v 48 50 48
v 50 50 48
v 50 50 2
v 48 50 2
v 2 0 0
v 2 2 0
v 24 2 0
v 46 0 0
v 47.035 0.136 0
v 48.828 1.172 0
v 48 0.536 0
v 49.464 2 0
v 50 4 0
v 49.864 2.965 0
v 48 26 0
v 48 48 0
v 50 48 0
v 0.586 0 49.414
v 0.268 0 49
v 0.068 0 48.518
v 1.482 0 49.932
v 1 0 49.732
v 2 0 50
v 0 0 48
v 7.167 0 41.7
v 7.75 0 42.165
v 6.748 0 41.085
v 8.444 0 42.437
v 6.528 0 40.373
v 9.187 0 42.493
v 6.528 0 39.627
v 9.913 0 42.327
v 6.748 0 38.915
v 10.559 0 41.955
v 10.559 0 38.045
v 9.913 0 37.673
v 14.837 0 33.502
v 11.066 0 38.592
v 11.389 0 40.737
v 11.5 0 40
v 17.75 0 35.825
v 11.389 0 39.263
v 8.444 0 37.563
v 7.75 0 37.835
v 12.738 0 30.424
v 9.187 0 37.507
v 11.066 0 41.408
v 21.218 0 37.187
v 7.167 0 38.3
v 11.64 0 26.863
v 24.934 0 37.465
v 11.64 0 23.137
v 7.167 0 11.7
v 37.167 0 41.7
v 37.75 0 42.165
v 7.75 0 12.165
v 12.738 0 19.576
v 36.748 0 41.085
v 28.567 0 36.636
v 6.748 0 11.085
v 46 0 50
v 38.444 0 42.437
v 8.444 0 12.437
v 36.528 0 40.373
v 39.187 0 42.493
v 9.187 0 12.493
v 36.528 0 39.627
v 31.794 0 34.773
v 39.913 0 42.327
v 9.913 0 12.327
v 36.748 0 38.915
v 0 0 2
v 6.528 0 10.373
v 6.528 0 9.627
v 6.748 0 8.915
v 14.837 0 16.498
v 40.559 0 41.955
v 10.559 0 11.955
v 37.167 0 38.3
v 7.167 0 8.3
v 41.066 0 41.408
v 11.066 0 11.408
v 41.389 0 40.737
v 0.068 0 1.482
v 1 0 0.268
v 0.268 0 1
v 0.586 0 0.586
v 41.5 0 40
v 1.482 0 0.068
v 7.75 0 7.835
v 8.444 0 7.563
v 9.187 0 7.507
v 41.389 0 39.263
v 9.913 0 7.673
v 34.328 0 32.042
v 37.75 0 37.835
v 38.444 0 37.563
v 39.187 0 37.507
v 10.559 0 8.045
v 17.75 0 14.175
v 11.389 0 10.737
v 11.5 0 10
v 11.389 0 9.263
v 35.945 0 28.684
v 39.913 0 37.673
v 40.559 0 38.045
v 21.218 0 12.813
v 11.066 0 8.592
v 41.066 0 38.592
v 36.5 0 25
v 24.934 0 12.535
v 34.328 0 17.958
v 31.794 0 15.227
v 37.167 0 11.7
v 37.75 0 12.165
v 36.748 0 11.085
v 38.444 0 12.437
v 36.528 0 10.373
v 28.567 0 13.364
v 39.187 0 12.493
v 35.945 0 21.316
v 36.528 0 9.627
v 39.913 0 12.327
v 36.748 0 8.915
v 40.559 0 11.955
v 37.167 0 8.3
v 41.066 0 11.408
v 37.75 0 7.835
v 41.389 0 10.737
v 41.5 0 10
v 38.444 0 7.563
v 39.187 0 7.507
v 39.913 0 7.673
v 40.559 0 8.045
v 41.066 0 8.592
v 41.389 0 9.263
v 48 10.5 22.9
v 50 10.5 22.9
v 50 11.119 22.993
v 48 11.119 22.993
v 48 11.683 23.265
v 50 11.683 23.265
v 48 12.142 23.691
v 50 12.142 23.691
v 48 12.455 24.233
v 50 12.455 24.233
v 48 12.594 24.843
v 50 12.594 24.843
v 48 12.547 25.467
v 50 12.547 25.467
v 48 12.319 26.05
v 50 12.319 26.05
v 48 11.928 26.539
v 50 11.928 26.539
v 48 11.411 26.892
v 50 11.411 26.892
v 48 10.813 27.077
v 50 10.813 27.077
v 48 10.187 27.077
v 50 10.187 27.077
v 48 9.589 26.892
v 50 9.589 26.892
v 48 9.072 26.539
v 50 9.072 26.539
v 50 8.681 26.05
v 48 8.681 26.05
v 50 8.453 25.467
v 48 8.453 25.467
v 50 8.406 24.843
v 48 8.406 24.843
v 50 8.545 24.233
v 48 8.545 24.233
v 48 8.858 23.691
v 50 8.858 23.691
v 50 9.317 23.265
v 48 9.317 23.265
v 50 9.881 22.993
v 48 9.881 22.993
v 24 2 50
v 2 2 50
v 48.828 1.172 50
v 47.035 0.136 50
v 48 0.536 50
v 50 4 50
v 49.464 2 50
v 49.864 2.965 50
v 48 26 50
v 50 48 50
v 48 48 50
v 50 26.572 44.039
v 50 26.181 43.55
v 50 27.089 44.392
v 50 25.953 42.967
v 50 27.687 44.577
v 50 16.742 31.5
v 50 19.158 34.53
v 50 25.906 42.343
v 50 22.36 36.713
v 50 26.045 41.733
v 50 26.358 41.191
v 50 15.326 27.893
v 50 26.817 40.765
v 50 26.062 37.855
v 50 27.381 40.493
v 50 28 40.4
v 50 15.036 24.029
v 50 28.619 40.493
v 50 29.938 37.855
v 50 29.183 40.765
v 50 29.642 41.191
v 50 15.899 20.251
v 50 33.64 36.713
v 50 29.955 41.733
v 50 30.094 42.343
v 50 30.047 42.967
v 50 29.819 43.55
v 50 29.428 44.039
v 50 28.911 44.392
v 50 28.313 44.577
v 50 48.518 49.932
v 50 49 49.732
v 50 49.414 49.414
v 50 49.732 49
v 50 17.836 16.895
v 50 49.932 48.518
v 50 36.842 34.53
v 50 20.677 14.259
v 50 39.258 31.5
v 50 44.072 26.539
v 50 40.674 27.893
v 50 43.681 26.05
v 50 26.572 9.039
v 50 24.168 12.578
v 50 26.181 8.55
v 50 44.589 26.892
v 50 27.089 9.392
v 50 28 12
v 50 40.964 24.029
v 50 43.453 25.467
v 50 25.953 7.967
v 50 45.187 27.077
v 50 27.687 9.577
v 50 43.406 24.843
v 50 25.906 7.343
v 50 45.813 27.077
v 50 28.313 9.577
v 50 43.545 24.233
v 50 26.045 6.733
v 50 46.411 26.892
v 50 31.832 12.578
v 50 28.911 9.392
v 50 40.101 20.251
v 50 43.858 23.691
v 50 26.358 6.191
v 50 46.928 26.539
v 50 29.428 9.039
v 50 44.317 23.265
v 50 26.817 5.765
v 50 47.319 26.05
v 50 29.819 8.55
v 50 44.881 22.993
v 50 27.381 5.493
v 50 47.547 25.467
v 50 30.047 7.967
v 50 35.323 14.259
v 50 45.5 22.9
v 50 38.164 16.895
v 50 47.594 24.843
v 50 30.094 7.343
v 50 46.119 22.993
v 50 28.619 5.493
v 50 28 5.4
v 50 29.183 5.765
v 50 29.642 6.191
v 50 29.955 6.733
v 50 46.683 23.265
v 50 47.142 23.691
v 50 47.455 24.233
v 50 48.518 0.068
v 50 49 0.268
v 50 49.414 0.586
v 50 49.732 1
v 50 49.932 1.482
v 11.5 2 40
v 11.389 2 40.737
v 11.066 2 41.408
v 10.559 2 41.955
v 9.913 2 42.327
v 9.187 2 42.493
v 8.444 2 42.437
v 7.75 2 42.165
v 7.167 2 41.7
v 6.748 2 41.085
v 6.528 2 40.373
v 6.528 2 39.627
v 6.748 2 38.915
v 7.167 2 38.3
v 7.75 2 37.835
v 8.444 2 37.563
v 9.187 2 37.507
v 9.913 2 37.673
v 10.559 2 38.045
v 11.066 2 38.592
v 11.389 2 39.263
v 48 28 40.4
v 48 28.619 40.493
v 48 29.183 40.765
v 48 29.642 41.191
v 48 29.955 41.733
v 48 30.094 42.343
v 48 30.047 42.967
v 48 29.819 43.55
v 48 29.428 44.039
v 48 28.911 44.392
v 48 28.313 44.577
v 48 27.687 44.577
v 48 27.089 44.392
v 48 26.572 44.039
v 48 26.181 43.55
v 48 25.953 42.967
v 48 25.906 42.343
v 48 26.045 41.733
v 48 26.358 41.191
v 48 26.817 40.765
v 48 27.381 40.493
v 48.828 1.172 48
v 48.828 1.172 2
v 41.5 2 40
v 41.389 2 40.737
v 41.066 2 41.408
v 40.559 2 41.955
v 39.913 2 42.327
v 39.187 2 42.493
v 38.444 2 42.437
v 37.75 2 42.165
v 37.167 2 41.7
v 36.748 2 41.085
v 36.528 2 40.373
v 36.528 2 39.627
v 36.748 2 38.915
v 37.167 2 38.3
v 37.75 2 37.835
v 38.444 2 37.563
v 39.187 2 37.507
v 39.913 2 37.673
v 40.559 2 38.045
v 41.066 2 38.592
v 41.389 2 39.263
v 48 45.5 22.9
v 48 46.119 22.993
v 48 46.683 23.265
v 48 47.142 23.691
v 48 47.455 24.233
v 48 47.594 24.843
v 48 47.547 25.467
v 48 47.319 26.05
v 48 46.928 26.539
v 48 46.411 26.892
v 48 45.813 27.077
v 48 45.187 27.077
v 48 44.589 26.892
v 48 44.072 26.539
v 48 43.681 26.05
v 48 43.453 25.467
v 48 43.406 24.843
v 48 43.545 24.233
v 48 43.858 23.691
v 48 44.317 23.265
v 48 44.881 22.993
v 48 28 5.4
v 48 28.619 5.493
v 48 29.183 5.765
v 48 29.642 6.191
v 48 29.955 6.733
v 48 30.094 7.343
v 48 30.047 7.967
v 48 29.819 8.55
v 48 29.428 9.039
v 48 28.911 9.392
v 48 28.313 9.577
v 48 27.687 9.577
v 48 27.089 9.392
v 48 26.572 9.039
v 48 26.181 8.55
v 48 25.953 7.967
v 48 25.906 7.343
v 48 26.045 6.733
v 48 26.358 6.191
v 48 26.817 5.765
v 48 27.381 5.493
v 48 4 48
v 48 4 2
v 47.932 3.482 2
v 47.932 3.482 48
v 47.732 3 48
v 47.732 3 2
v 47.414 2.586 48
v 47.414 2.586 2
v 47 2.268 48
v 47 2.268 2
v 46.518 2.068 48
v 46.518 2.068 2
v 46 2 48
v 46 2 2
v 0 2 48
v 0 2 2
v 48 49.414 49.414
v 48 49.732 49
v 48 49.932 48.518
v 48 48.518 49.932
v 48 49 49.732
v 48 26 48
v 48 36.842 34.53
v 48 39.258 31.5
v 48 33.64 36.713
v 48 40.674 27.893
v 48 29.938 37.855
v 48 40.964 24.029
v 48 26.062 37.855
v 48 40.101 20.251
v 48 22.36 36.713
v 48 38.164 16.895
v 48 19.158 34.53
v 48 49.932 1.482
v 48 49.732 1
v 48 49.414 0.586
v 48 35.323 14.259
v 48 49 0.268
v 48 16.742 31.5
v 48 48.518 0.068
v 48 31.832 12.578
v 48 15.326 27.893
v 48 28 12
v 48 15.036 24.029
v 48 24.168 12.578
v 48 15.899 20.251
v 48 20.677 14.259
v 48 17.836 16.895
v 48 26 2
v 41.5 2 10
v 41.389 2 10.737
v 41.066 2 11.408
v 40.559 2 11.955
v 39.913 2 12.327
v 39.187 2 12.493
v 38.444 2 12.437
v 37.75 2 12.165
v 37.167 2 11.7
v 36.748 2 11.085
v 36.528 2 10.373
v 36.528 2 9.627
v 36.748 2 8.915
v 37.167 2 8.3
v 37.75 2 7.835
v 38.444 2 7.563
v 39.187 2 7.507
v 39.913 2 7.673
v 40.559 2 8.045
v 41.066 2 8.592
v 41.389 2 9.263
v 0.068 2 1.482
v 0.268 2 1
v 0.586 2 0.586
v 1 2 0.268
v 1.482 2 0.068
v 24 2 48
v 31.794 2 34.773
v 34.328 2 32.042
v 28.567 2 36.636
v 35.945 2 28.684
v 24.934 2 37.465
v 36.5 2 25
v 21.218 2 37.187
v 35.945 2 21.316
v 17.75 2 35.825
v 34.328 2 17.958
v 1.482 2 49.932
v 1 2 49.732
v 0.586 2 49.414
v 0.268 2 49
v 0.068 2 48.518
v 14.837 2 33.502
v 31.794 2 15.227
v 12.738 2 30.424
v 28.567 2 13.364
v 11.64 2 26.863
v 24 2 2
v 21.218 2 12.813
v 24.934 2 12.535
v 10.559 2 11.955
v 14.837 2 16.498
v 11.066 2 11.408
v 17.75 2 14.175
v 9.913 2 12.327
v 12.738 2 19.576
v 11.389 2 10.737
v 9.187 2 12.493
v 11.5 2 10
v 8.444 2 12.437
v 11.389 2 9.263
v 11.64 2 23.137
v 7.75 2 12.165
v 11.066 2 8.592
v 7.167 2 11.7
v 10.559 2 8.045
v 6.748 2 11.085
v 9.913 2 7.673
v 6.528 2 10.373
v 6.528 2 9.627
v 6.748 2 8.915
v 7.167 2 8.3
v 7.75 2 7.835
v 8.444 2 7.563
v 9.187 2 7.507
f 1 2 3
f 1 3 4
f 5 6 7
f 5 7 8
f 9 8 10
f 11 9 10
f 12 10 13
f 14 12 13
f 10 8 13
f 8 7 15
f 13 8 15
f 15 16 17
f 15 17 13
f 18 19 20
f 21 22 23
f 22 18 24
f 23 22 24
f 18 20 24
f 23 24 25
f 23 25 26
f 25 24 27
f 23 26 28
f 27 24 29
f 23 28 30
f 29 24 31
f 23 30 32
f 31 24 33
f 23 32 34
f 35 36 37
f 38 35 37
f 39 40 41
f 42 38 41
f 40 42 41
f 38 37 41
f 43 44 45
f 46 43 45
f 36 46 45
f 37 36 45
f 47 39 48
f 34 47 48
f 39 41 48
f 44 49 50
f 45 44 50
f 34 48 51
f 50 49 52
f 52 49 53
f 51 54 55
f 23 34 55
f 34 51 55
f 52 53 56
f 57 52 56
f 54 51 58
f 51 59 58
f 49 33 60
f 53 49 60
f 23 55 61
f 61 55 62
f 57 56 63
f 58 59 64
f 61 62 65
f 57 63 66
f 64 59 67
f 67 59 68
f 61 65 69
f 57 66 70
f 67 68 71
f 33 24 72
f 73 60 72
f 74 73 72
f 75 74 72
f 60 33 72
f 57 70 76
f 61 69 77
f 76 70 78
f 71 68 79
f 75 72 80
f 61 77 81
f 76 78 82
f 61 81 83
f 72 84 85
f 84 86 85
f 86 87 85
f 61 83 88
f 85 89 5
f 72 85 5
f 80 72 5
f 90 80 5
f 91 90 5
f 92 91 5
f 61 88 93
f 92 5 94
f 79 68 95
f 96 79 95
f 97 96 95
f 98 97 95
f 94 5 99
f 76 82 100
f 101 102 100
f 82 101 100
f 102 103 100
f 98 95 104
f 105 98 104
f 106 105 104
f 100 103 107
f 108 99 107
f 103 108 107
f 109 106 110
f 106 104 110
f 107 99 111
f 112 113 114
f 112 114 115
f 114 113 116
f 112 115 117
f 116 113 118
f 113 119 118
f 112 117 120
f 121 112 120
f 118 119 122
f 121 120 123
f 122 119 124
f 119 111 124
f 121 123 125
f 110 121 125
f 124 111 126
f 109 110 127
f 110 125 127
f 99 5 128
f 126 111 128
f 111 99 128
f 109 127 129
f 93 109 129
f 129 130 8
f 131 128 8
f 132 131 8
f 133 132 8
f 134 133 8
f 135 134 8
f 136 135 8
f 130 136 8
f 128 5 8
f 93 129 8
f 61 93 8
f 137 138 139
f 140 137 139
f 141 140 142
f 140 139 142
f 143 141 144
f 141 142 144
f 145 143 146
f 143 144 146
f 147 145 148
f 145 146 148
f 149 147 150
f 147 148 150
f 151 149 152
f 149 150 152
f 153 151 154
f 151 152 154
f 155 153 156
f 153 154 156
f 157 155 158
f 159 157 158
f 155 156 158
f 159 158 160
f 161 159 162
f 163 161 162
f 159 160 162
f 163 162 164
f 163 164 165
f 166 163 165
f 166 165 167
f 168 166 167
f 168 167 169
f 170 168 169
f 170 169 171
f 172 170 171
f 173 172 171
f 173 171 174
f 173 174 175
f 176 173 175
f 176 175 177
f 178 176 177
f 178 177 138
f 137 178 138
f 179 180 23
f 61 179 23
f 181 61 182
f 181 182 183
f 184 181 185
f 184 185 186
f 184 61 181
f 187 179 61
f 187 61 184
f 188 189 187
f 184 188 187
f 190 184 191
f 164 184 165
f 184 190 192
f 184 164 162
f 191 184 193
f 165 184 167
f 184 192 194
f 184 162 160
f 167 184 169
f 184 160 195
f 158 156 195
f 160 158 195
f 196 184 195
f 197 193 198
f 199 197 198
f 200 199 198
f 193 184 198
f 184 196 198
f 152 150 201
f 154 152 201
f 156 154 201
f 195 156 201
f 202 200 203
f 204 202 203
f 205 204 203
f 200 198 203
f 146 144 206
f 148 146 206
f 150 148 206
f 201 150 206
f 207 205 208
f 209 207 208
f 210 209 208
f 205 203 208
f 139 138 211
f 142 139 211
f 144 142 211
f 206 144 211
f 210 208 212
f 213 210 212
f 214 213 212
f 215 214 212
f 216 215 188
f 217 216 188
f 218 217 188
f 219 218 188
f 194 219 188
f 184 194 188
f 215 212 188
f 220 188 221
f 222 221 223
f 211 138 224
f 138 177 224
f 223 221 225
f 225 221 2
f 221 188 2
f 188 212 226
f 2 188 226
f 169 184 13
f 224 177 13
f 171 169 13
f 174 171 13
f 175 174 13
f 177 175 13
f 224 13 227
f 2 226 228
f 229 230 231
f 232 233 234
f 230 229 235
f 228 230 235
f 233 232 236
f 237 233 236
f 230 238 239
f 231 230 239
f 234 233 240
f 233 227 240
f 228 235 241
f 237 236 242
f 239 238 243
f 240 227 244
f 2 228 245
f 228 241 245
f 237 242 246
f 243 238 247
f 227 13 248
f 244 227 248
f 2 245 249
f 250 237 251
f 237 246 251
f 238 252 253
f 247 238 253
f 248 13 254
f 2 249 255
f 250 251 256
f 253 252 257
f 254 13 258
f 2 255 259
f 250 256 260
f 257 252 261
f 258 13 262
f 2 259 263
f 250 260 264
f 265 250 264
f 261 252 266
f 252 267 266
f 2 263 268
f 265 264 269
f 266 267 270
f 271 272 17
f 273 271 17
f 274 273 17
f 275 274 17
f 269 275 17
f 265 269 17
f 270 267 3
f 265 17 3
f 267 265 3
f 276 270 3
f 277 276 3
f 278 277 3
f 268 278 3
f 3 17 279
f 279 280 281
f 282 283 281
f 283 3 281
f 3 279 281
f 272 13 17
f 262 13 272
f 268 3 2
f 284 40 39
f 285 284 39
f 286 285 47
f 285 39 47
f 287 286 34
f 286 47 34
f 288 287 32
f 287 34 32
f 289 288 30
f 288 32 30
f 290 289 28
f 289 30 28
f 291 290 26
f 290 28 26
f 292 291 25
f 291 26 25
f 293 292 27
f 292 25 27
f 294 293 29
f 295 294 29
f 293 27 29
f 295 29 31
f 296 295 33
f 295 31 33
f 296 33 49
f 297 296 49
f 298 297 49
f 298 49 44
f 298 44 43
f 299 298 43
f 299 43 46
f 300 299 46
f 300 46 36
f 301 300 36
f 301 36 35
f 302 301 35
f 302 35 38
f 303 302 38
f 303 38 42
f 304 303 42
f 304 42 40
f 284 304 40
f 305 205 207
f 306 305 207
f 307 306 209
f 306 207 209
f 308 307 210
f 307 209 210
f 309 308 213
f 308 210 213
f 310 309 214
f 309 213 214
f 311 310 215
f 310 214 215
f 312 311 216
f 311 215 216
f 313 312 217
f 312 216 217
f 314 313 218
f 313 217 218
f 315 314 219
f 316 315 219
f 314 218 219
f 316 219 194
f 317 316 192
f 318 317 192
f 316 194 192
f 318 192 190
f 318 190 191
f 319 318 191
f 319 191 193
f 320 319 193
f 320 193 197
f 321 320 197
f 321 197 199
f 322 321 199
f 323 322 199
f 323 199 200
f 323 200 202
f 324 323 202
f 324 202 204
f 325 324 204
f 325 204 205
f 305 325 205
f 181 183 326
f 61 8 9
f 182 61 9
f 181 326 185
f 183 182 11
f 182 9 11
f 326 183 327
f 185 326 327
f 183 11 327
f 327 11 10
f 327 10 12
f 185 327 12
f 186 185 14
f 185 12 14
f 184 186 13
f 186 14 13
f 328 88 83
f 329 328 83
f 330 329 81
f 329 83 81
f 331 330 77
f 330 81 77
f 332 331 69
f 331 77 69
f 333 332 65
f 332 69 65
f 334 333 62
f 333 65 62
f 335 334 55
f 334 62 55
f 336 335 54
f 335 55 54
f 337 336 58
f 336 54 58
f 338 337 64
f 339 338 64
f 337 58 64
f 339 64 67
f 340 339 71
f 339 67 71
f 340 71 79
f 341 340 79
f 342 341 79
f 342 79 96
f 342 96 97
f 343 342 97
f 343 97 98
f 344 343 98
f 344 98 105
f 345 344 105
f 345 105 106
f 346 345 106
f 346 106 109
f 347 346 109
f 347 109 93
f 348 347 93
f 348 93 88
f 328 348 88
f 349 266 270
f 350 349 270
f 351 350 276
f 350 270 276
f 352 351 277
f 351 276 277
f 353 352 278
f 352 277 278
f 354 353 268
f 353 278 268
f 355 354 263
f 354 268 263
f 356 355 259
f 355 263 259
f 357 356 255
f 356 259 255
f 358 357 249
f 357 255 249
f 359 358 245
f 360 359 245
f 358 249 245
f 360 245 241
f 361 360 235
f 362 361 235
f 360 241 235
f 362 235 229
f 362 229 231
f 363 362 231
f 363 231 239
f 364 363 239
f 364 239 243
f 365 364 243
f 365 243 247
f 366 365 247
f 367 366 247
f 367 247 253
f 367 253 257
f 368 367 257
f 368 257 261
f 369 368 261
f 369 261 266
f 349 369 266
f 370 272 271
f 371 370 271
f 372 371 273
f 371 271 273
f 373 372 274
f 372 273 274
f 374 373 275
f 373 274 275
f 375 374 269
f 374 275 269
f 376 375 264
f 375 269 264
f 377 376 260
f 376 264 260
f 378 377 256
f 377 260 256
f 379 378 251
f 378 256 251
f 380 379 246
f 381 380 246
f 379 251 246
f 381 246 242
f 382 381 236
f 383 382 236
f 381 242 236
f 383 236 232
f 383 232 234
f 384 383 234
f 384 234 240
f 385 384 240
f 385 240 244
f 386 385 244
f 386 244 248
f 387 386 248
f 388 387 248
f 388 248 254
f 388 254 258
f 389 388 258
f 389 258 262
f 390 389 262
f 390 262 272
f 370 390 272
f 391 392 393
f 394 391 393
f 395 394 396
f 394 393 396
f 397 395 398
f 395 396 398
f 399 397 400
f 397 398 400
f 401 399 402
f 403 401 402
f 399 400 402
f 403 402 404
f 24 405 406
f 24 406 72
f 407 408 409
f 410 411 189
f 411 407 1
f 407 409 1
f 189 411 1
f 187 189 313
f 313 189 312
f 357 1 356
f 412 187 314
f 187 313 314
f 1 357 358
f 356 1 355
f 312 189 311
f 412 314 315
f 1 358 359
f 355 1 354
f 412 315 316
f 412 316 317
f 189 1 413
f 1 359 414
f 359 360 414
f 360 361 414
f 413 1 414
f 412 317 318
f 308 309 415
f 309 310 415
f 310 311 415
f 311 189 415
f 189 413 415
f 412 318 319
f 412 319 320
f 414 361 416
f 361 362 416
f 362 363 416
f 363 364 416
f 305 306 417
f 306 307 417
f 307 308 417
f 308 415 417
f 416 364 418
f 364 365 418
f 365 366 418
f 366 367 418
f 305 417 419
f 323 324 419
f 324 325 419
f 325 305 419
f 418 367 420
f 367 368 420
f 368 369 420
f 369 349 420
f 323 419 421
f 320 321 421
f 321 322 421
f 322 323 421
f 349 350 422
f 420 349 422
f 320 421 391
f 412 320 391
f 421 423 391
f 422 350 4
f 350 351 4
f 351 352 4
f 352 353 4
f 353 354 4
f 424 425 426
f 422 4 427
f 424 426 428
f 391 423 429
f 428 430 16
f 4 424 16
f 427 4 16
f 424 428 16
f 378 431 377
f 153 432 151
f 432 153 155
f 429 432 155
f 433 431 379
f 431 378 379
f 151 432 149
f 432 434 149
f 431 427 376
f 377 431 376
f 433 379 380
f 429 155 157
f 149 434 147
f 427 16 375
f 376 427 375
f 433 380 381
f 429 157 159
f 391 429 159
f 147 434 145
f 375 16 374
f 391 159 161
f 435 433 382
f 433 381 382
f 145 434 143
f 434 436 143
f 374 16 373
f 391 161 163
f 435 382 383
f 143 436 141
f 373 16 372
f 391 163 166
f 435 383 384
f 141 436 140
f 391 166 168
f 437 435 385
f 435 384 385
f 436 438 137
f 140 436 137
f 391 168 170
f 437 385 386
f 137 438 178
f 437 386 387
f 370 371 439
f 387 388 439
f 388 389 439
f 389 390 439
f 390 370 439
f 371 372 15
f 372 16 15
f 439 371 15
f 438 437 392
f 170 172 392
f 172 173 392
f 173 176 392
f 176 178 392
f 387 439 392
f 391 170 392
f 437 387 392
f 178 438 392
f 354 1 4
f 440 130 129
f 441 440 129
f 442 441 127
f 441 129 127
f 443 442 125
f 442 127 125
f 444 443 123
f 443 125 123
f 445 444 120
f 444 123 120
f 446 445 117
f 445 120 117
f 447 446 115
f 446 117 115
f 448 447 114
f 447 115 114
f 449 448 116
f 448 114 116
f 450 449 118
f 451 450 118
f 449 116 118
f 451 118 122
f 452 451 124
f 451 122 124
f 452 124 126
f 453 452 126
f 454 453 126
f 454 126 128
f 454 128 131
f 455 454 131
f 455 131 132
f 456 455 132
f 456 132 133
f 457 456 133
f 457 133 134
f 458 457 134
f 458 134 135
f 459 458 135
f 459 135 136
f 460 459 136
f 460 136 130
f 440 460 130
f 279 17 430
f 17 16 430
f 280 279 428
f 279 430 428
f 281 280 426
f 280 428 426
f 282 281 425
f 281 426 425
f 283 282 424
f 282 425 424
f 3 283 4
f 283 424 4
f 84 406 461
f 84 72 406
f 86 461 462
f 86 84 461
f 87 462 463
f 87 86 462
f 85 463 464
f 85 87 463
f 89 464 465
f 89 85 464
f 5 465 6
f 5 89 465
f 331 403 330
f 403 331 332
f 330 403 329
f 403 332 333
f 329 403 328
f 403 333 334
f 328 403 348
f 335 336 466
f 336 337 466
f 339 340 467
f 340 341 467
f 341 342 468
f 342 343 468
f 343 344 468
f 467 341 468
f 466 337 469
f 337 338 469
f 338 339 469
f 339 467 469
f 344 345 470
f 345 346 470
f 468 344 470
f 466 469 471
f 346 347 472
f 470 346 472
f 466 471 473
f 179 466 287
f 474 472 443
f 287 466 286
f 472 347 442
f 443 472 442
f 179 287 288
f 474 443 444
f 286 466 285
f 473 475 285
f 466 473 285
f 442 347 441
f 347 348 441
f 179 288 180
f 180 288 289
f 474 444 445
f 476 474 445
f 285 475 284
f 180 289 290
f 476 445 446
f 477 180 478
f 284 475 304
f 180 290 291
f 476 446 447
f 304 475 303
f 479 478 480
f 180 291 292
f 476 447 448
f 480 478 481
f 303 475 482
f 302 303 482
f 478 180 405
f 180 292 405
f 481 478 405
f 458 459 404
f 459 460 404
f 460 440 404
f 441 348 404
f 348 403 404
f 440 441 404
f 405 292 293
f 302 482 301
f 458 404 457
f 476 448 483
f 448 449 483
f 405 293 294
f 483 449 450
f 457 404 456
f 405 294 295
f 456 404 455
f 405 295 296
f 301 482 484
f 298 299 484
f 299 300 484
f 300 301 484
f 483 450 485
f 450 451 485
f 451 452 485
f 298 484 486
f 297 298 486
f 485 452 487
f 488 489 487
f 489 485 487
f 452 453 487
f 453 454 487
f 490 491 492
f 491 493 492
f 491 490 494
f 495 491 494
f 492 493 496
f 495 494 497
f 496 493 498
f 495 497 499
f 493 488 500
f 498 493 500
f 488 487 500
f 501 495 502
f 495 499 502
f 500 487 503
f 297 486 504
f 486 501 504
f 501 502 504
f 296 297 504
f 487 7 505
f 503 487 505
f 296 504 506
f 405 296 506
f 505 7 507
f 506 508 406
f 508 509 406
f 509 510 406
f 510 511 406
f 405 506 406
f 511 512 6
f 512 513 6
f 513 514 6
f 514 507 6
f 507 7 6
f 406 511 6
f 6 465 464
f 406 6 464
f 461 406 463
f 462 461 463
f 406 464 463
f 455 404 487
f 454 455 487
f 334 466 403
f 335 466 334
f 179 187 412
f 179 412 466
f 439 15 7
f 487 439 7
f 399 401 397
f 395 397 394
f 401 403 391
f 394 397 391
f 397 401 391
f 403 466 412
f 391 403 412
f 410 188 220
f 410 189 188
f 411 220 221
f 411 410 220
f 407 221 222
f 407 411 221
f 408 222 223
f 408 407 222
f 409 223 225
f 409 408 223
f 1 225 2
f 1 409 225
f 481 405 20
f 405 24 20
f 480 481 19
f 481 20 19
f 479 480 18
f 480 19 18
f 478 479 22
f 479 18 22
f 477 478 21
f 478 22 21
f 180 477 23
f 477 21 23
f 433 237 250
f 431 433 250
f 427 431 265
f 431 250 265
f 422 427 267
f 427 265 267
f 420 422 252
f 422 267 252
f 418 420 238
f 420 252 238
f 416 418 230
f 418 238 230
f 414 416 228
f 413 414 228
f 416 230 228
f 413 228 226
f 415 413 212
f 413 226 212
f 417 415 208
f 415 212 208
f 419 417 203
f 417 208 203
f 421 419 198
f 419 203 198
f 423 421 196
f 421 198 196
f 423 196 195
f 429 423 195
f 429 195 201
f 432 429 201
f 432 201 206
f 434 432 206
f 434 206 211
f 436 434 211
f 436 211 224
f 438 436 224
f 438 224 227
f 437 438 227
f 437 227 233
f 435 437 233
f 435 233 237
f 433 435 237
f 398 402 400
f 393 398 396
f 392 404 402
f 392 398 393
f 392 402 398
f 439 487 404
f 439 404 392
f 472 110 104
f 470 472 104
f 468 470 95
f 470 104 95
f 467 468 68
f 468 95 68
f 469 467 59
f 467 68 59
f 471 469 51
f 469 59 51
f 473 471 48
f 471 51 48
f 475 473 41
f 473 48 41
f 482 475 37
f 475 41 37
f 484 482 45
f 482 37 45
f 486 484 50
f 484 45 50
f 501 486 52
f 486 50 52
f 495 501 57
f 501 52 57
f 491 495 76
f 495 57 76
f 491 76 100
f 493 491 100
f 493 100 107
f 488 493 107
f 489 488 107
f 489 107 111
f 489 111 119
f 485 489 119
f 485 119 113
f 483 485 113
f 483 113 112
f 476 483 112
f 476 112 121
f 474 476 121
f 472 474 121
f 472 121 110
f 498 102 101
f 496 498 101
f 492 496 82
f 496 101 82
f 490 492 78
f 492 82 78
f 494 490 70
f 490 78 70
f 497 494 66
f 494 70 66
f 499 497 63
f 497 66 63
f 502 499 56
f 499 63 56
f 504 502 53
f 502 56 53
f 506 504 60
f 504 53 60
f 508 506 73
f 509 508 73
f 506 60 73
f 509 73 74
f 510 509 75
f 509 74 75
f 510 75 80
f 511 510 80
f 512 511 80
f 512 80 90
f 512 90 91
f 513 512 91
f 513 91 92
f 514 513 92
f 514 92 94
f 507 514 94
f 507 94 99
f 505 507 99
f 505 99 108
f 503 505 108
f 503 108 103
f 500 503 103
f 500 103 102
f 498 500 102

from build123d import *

# Parameters (mm, degrees)
EXTRUDE_1_DEPTH     = 50
SKETCH_2_R          = 13
SKETCH_2_R_2        = 2.1
CUT_EXTRUDE_1_DEPTH = 50
FILLET_1_R          = 2
SKETCH_4_R          = 12.5
SKETCH_4_R_2        = 2.5
CUT_EXTRUDE_2_DEPTH = 50
EXTRUDE_2_DEPTH     = 2
EXTRUDE_START       = -50
EXTRUDE_3_DEPTH     = 2


with BuildPart() as part:
    # 草图1 → 凸台-拉伸1 (new body)
    with BuildSketch(Plane.XY):
        with BuildLine():
            Line((0, 0), (46, 0))
            ThreePointArc((46, 0), (48.828427125, 1.171572875), (50, 4))
            Line((50, 4), (50, 50))
            Line((50, 50), (48, 50))
            Line((48, 50), (48, 4))
            ThreePointArc((48, 4), (47.414213562, 2.585786438), (46, 2))
            Line((46, 2), (0, 2))
            Line((0, 2), (0, 0))
        make_face()
    extrude(amount=EXTRUDE_1_DEPTH)

    # 草图2 → 切除-拉伸1 (cut)
    with BuildSketch(Plane(origin=(50, 0, 0), x_dir=(0, 0, -1), z_dir=(1, 0, 0))):
        with Locations((-25, 28)):
            Circle(SKETCH_2_R)
        with Locations((-25, 45.5)):
            Circle(SKETCH_2_R_2)
        with Locations((-7.5, 28)):
            Circle(SKETCH_2_R_2)
        with Locations((-25, 10.5)):
            Circle(SKETCH_2_R_2)
        with Locations((-42.5, 28)):
            Circle(SKETCH_2_R_2)
    extrude(amount=-CUT_EXTRUDE_1_DEPTH, mode=Mode.SUBTRACT)

    # 圆角1
    fillet_1_edges = [part.edges().sort_by_distance(p)[0] for p in [
        (0, 1, 0),
        (49, 50, 50),
        (0, 1, 50),
        (49, 50, 0),
    ]]
    fillet(fillet_1_edges, radius=FILLET_1_R)

    # 草图4 → 切除-拉伸2 (cut)
    with BuildSketch(Plane.XZ):
        with Locations((24, 25)):
            Circle(SKETCH_4_R)
        with Locations((39, 10)):
            Circle(SKETCH_4_R_2)
        with Locations((9, 10)):
            Circle(SKETCH_4_R_2)
        with Locations((9, 40)):
            Circle(SKETCH_4_R_2)
        with Locations((39, 40)):
            Circle(SKETCH_4_R_2)
    extrude(amount=-CUT_EXTRUDE_2_DEPTH, mode=Mode.SUBTRACT)

    # 草图5 → 凸台-拉伸2 (add)
    with BuildSketch(Plane(origin=(0, 0, 0), x_dir=(-1, 0, 0), z_dir=(0, 0, -1))):
        Polygon((-48, 26), (-24, 2), (-48.828427125, 1.171572875), align=None)
    extrude(amount=-EXTRUDE_2_DEPTH)

    # 草图5<2> → 凸台-拉伸3 (add)
    with BuildSketch(Plane(origin=(0, 0, 0), x_dir=(-1, 0, 0), z_dir=(0, 0, -1)).offset(EXTRUDE_START)):
        Polygon((-48, 26), (-24, 2), (-48.828427125, 1.171572875), align=None)
    extrude(amount=EXTRUDE_3_DEPTH)


solid = part.part
